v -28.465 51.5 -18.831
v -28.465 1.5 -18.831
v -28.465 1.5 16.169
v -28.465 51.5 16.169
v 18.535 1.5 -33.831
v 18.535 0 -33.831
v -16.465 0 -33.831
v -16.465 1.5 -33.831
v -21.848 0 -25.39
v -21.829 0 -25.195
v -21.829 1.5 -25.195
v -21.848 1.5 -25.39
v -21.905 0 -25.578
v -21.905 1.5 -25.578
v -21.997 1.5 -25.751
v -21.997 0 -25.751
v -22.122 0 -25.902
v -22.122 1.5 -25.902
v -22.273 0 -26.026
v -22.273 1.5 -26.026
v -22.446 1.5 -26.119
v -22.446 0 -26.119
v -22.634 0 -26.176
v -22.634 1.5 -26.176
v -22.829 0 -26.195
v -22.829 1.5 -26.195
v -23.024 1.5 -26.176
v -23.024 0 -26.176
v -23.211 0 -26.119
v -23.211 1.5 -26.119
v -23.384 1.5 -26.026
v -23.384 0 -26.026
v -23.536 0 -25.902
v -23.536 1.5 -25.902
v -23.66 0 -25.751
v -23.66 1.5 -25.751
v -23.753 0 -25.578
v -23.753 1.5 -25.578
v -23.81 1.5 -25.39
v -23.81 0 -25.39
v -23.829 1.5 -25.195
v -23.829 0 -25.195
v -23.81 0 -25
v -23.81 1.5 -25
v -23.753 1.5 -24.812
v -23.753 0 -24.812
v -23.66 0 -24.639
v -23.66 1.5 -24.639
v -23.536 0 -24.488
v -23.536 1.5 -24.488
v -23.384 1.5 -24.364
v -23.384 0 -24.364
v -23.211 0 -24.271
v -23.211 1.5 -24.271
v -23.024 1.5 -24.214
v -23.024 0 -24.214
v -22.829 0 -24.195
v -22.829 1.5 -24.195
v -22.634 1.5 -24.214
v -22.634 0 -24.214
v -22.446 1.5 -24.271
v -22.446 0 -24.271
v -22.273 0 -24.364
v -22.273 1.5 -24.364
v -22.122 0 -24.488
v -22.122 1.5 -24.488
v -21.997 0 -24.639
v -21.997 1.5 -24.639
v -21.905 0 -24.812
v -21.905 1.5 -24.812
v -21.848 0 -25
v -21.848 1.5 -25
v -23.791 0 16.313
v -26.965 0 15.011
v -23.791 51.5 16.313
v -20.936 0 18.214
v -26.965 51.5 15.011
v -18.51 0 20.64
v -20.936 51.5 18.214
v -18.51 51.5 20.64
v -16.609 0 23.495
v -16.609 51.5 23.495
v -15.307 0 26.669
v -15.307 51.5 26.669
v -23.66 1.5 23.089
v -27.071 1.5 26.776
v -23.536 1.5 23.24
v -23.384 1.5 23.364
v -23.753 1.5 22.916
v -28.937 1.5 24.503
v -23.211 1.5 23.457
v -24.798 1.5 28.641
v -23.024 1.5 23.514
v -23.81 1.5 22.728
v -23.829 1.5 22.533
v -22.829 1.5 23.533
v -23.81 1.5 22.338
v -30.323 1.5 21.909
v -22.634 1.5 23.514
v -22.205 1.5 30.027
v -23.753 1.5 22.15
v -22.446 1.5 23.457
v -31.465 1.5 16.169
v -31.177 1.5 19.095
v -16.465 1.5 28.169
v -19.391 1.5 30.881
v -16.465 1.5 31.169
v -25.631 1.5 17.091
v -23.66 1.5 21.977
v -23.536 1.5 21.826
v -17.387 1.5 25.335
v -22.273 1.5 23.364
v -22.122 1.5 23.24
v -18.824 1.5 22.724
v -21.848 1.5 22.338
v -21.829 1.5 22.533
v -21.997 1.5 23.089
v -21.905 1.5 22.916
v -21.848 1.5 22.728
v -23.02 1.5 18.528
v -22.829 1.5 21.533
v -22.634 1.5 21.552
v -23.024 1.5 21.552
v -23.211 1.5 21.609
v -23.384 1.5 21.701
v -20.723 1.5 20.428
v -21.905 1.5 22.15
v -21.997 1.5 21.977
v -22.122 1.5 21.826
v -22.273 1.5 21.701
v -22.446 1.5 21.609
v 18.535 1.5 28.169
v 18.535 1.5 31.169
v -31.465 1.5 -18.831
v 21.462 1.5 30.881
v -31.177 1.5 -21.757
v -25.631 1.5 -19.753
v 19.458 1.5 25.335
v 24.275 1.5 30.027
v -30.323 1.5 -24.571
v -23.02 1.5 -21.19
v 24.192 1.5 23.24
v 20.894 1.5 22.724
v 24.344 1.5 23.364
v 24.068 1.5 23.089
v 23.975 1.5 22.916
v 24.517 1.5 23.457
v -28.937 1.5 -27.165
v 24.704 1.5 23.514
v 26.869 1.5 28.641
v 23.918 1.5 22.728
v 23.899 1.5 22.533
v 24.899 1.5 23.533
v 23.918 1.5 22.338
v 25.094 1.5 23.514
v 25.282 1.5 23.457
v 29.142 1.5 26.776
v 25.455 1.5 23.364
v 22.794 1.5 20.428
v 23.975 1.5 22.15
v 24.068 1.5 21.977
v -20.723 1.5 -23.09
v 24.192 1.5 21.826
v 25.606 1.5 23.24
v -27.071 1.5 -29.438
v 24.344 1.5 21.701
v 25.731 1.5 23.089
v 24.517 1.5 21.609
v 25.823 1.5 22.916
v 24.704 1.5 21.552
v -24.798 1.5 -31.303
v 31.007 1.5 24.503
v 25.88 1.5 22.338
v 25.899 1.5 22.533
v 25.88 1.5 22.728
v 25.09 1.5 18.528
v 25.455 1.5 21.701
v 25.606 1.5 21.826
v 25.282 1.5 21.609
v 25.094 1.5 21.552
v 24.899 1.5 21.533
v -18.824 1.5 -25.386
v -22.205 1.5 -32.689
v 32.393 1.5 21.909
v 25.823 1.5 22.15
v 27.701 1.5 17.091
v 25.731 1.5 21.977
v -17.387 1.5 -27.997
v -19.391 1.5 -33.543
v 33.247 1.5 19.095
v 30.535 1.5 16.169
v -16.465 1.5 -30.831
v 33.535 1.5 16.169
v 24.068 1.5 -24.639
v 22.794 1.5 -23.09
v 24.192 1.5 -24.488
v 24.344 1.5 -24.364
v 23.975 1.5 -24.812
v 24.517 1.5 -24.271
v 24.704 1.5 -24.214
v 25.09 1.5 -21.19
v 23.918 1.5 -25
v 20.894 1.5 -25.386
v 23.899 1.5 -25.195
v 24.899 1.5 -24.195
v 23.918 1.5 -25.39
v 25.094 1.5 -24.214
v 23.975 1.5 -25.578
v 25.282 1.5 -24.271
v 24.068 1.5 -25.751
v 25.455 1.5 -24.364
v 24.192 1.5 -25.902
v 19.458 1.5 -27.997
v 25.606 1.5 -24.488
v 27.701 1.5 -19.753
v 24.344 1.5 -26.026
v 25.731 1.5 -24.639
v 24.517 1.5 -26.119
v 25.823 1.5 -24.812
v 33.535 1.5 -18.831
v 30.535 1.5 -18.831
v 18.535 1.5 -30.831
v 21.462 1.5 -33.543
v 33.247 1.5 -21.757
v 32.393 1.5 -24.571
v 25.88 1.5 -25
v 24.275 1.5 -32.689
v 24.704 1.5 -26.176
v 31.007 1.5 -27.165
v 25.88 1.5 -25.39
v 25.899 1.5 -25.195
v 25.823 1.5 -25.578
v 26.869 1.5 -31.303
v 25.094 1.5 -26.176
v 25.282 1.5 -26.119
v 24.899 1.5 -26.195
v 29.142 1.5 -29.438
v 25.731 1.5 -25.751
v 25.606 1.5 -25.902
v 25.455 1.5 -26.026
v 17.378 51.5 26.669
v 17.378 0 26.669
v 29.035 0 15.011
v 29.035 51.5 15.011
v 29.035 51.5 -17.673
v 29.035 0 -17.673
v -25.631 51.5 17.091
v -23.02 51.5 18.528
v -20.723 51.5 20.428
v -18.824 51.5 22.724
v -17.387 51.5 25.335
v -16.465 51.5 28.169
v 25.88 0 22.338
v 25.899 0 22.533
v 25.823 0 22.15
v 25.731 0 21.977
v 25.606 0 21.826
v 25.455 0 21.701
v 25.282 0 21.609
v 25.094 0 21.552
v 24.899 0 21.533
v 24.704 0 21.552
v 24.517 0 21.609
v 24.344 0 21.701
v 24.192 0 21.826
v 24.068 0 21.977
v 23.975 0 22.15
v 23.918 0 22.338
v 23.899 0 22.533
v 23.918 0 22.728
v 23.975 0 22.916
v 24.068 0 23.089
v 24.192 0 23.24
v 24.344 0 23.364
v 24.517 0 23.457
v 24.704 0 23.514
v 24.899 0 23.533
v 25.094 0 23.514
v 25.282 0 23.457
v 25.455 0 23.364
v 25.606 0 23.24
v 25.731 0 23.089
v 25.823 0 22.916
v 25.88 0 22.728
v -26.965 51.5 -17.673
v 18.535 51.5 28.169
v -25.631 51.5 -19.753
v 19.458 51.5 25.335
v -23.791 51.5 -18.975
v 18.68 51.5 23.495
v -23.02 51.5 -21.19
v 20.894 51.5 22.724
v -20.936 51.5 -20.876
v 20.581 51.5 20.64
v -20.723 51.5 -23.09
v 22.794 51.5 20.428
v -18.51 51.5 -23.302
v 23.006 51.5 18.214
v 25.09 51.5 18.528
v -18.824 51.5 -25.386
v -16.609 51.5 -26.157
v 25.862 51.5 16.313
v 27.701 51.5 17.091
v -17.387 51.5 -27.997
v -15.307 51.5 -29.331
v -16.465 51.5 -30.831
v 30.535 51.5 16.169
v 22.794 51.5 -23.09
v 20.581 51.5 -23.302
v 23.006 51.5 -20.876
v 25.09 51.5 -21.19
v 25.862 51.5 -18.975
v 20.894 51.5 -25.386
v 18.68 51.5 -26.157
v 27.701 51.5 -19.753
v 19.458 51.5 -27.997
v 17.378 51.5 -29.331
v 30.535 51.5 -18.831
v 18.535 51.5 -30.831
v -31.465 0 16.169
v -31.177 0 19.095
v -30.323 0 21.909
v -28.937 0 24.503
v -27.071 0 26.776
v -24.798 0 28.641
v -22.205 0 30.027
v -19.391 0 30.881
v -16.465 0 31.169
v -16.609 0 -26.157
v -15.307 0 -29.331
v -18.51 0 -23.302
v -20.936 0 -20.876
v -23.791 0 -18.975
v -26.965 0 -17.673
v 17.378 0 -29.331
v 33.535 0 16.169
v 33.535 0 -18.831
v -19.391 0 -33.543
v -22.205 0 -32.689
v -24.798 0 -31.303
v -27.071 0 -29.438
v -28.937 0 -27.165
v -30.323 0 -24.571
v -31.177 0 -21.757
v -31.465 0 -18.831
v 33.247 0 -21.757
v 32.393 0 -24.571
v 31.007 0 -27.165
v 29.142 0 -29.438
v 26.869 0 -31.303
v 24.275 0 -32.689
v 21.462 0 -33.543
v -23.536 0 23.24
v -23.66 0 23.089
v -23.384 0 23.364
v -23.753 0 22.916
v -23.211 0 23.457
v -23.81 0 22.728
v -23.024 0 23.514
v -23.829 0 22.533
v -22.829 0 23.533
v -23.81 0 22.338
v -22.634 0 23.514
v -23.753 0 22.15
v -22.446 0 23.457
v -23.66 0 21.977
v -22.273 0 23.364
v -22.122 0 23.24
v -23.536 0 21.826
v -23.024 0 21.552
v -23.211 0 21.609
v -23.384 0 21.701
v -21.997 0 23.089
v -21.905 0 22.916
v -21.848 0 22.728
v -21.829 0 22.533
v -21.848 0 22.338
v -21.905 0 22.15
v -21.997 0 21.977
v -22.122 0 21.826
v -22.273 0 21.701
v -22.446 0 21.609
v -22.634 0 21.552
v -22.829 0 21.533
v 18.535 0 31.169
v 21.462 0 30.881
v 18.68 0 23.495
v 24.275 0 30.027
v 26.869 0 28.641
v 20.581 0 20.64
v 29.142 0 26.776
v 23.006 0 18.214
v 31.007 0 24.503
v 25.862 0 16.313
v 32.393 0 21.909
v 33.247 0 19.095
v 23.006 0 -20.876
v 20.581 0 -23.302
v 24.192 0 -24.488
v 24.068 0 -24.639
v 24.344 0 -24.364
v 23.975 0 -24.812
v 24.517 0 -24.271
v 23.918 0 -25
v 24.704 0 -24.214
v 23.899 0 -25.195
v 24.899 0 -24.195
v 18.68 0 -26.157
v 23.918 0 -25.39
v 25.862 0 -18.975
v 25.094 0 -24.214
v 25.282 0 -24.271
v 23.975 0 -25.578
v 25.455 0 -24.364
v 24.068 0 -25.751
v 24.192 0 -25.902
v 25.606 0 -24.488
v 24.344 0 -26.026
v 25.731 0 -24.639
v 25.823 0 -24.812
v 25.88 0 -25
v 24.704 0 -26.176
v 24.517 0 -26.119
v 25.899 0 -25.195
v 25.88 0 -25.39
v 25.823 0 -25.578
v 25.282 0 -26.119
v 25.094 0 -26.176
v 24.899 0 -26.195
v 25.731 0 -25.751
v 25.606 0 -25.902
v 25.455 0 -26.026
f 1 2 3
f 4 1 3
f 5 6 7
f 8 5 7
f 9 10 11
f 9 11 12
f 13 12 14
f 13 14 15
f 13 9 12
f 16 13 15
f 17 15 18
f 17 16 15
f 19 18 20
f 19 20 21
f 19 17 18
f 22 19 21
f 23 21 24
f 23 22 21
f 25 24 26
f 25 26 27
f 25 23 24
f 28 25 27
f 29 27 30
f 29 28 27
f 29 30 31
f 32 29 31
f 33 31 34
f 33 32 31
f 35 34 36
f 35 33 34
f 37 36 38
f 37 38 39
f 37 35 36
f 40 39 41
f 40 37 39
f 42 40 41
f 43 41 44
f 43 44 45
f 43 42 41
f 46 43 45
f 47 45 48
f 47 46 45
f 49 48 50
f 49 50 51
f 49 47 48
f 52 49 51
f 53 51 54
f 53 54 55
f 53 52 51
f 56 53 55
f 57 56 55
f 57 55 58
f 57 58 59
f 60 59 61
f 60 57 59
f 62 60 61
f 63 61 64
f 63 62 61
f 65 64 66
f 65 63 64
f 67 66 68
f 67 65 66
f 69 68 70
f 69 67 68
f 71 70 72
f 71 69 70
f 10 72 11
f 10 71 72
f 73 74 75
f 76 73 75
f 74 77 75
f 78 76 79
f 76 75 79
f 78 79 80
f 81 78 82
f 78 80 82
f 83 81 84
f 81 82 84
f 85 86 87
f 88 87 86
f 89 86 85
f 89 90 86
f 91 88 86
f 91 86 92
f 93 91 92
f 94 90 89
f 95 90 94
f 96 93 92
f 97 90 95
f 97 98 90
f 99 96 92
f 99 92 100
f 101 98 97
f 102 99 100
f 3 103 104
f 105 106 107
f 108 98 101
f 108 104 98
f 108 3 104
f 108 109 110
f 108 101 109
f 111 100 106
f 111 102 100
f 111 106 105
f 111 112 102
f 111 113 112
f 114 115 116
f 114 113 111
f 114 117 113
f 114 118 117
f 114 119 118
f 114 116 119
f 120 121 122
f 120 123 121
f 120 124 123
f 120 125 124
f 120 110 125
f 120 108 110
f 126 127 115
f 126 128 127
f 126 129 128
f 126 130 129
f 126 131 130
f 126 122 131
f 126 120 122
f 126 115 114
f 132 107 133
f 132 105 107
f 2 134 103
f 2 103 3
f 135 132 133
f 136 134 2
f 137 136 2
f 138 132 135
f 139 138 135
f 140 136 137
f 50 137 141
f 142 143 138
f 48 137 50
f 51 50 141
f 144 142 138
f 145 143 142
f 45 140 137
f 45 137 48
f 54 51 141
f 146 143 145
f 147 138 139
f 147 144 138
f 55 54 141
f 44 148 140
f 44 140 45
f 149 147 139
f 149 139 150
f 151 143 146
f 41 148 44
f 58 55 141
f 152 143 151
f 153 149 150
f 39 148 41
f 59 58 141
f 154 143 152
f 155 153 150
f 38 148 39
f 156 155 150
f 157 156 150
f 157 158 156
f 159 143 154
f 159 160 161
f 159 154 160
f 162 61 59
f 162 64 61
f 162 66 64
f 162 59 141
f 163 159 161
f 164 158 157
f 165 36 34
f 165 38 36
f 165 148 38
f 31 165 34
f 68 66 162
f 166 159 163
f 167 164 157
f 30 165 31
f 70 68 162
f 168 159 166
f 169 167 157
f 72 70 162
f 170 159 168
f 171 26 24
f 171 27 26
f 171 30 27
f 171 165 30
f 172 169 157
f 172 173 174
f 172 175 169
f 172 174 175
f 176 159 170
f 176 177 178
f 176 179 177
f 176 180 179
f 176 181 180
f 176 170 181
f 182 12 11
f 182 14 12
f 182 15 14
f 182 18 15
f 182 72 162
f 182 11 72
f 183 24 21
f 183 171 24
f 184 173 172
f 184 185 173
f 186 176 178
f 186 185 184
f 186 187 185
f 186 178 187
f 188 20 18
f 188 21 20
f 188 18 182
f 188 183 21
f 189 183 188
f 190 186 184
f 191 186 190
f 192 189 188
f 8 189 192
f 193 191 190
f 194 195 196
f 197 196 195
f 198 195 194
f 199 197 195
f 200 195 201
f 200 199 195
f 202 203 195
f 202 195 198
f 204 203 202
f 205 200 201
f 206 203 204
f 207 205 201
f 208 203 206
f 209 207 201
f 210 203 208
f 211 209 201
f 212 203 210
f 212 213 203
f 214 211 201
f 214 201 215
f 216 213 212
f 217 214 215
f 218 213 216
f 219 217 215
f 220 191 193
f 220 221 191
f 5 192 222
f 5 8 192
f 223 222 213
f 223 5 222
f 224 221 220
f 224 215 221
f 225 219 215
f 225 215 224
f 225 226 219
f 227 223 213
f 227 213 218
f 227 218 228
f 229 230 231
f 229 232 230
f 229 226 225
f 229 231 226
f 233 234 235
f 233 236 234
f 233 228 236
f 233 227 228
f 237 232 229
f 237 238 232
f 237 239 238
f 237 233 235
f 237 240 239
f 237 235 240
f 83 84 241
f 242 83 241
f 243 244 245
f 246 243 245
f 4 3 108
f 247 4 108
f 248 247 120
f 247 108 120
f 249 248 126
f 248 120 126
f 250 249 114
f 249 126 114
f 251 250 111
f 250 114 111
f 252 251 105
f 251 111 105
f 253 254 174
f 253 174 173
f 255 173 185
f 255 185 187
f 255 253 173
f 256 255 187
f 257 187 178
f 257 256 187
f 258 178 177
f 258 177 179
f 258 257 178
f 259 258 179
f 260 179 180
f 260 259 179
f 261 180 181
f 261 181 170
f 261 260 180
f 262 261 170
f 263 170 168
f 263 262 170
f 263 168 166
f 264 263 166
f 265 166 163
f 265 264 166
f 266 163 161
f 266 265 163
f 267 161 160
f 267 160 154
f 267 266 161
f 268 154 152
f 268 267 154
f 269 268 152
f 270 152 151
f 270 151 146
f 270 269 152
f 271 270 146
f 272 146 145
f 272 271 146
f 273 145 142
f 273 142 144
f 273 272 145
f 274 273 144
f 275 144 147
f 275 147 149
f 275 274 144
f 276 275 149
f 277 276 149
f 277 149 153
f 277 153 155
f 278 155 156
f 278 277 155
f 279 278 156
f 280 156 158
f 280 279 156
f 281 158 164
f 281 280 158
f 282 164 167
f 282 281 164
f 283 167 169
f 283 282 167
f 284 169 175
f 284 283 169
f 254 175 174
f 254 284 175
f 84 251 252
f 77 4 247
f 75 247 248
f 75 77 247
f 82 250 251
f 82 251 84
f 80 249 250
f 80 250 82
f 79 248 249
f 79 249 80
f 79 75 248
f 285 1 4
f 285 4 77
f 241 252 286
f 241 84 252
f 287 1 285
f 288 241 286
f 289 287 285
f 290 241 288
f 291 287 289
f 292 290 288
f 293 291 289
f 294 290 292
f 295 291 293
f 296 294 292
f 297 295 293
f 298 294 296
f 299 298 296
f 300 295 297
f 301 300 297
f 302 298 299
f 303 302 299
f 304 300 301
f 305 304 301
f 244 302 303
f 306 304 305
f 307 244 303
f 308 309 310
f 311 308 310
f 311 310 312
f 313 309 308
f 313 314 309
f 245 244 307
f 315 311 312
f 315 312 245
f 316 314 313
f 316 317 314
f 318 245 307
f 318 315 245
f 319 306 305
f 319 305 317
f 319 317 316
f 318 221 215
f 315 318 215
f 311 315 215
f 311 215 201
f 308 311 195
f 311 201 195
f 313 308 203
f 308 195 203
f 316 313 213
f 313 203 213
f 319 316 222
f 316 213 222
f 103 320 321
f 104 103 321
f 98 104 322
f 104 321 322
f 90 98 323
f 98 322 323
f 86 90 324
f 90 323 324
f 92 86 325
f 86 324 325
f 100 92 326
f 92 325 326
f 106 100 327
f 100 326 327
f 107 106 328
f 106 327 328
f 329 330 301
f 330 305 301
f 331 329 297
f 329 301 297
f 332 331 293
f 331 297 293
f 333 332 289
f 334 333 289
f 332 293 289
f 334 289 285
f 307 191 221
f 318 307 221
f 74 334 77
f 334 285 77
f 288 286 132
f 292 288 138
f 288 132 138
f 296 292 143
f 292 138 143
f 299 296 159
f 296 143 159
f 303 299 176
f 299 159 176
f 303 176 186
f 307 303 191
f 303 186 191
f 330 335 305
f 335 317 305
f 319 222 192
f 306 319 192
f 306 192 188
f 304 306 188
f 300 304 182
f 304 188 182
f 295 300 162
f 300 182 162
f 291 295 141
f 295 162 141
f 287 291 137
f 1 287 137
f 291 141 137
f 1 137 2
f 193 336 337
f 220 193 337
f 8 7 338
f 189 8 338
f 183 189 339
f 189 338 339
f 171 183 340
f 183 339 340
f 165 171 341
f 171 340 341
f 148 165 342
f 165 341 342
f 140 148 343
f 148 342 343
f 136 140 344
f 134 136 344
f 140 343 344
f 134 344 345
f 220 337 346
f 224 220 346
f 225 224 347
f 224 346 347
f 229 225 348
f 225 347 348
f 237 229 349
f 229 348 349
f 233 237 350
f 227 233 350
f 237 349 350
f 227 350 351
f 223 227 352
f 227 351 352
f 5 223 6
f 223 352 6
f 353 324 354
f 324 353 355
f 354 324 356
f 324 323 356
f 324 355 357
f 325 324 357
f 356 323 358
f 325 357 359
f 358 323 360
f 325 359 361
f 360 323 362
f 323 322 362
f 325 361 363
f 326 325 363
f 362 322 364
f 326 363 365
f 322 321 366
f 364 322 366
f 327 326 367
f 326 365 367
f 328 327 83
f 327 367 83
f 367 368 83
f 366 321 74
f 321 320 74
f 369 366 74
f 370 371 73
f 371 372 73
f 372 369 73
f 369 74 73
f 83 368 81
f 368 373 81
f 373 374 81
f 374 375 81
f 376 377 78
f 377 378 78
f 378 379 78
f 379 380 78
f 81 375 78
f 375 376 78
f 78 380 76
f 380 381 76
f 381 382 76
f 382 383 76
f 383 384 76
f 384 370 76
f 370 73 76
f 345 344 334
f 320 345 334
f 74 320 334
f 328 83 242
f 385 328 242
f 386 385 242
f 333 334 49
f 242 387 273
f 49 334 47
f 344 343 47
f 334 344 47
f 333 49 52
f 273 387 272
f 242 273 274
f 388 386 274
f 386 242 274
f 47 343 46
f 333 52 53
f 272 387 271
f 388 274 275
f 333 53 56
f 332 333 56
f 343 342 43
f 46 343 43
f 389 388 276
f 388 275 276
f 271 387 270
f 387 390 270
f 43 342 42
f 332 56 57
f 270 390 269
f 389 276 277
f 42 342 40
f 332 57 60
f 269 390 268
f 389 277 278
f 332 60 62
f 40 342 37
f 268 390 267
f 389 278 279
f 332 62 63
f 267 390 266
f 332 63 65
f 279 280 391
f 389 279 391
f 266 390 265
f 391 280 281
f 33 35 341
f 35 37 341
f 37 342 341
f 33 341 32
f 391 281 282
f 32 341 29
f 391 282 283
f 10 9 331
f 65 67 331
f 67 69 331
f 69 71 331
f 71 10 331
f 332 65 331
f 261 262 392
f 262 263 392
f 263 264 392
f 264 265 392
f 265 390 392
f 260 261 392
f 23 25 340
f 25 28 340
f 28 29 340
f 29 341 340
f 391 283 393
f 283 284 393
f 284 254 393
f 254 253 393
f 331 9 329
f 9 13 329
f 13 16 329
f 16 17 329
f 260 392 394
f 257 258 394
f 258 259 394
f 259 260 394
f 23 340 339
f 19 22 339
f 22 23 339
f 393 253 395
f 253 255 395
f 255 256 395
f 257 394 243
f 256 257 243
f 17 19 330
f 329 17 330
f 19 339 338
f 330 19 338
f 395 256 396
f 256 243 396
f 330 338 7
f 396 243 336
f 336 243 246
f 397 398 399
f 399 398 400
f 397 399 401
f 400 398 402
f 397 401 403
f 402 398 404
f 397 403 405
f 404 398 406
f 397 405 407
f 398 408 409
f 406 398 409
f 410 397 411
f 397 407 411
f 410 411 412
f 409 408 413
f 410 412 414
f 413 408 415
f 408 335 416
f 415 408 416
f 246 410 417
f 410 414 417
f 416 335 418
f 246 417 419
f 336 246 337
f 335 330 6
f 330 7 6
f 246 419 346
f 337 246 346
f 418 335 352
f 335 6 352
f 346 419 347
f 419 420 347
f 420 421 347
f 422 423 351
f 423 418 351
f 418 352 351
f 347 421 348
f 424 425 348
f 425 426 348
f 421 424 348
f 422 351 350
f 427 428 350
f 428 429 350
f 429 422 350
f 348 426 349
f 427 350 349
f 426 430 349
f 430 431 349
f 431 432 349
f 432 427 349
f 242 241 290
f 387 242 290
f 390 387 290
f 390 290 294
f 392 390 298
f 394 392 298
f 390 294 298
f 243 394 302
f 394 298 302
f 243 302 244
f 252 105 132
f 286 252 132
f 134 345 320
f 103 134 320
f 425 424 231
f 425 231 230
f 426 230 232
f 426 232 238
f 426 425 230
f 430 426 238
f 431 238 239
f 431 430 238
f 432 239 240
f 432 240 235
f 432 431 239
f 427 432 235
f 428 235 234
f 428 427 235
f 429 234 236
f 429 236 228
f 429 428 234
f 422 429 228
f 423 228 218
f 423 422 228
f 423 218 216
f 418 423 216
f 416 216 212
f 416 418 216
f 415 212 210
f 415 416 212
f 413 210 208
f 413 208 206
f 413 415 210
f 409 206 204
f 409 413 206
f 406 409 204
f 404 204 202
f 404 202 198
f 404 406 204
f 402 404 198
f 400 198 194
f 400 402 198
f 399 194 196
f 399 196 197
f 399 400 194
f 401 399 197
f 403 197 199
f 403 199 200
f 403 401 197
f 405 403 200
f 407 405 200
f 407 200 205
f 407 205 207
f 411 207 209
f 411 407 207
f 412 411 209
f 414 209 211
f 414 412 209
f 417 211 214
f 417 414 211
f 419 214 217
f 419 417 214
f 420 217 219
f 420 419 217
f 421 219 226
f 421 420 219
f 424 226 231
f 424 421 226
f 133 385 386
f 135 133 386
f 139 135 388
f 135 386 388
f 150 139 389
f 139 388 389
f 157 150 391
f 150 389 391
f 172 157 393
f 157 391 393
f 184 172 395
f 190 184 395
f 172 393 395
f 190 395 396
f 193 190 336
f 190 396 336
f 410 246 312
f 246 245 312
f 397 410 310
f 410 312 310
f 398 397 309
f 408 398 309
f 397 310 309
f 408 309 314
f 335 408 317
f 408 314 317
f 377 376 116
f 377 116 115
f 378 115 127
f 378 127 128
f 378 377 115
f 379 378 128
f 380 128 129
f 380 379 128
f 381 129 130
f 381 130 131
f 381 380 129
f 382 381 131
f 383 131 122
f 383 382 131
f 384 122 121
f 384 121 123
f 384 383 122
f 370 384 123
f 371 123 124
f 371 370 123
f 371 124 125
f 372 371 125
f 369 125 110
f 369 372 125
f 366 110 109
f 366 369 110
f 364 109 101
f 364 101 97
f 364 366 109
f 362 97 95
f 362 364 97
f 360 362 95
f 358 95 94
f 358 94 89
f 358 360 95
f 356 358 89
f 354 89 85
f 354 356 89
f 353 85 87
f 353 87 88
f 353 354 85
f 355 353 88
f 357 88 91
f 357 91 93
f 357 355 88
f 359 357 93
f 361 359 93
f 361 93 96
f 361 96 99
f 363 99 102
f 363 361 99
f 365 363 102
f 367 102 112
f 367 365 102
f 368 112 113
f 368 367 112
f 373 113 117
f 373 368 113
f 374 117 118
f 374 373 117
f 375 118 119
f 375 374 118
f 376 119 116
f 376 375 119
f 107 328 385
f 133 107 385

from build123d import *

# Parameters (mm, degrees)
SKETCH1_R                = 1
BOSS_EXTRUDE1_DEPTH      = 1.5
BOSS_EXTRUDE2_DEPTH      = 50
BOSS_EXTRUDE2_DEPTH_BACK = 1.5


with BuildPart() as part:
    # Sketch1 → Boss-Extrude1 (new body)
    with BuildSketch(Plane(origin=(0, 0, 0), x_dir=(1, 0, 0), z_dir=(0, 1, 0))):
        with BuildLine():
            Line((33.535245878, -16.168969585), (33.535245878, 18.831030415))
            ThreePointArc((33.535245878, 18.831030415), (29.141847596, 29.437632132), (18.535245878, 33.831030415))
            Line((18.535245878, 33.831030415), (-16.464754122, 33.831030415))
            ThreePointArc((-16.464754122, 33.831030415), (-27.07135584, 29.437632132), (-31.464754122, 18.831030415))
            Line((-31.464754122, 18.831030415), (-31.464754122, -16.168969585))
            ThreePointArc((-31.464754122, -16.168969585), (-27.07135584, -26.775571303), (-16.464754122, -31.168969585))
            Line((-16.464754122, -31.168969585), (18.535245878, -31.168969585))
            ThreePointArc((18.535245878, -31.168969585), (29.141847596, -26.775571303), (33.535245878, -16.168969585))
        make_face()
        with Locations((24.899206909, -22.532930616)):
            Circle(SKETCH1_R, mode=Mode.SUBTRACT)
        with Locations((-22.828715153, -22.532930616)):
            Circle(SKETCH1_R, mode=Mode.SUBTRACT)
        with Locations((-22.828715153, 25.194991445)):
            Circle(SKETCH1_R, mode=Mode.SUBTRACT)
        with Locations((24.899206909, 25.194991445)):
            Circle(SKETCH1_R, mode=Mode.SUBTRACT)
        with BuildLine():
            Line((18.535245878, -28.168969585), (-16.464754122, -28.168969585))
            ThreePointArc((-16.464754122, -28.168969585), (-20.723457919, -20.427673383), (-28.464754122, -16.168969585))
            Line((-28.464754122, -16.168969585), (-28.464754122, 18.831030415))
            ThreePointArc((-28.464754122, 18.831030415), (-20.723457919, 23.089734212), (-16.464754122, 30.831030415))
            Line((-16.464754122, 30.831030415), (18.535245878, 30.831030415))
            ThreePointArc((18.535245878, 30.831030415), (22.793949675, 23.089734212), (30.535245878, 18.831030415))
            Line((30.535245878, 18.831030415), (30.535245878, -16.168969585))
            ThreePointArc((30.535245878, -16.168969585), (22.793949675, -20.427673383), (18.535245878, -28.168969585))
        make_face(mode=Mode.SUBTRACT)
    extrude(amount=BOSS_EXTRUDE1_DEPTH)

    # Sketch2 → Boss-Extrude2 (add, two sides)
    with BuildSketch(Plane(origin=(0, 1.5, 0), x_dir=(1, 0, 0), z_dir=(0, 1, 0))) as boss_extrude2_sk:
        with BuildLine():
            Line((-28.464754122, 18.831030415), (-28.464754122, -16.168969585))
            ThreePointArc((-28.464754122, -16.168969585), (-20.723457919, -20.427673383), (-16.464754122, -28.168969585))
            Line((-16.464754122, -28.168969585), (18.535245878, -28.168969585))
            ThreePointArc((18.535245878, -28.168969585), (22.793949675, -20.427673383), (30.535245878, -16.168969585))
            Line((30.535245878, -16.168969585), (30.535245878, 18.831030415))
            ThreePointArc((30.535245878, 18.831030415), (22.793949675, 23.089734212), (18.535245878, 30.831030415))
            Line((18.535245878, 30.831030415), (-16.464754122, 30.831030415))
            ThreePointArc((-16.464754122, 30.831030415), (-20.723457919, 23.089734212), (-28.464754122, 18.831030415))
        make_face()
        with BuildLine():
            Line((29.035245878, -15.01127646), (29.035245878, 17.673337289))
            ThreePointArc((29.035245878, 17.673337289), (21.733289504, 22.02907404), (17.377552753, 29.331030415))
            Line((17.377552753, 29.331030415), (-15.307060997, 29.331030415))
            ThreePointArc((-15.307060997, 29.331030415), (-19.662797748, 22.02907404), (-26.964754122, 17.673337289))
            Line((-26.964754122, 17.673337289), (-26.964754122, -15.01127646))
            ThreePointArc((-26.964754122, -15.01127646), (-19.662797748, -19.367013211), (-15.307060997, -26.668969585))
            Line((-15.307060997, -26.668969585), (17.377552753, -26.668969585))
            ThreePointArc((17.377552753, -26.668969585), (21.733289504, -19.367013211), (29.035245878, -15.01127646))
        make_face(mode=Mode.SUBTRACT)
    extrude(amount=BOSS_EXTRUDE2_DEPTH)
    extrude(boss_extrude2_sk.sketch, amount=-BOSS_EXTRUDE2_DEPTH_BACK)


solid = part.part
